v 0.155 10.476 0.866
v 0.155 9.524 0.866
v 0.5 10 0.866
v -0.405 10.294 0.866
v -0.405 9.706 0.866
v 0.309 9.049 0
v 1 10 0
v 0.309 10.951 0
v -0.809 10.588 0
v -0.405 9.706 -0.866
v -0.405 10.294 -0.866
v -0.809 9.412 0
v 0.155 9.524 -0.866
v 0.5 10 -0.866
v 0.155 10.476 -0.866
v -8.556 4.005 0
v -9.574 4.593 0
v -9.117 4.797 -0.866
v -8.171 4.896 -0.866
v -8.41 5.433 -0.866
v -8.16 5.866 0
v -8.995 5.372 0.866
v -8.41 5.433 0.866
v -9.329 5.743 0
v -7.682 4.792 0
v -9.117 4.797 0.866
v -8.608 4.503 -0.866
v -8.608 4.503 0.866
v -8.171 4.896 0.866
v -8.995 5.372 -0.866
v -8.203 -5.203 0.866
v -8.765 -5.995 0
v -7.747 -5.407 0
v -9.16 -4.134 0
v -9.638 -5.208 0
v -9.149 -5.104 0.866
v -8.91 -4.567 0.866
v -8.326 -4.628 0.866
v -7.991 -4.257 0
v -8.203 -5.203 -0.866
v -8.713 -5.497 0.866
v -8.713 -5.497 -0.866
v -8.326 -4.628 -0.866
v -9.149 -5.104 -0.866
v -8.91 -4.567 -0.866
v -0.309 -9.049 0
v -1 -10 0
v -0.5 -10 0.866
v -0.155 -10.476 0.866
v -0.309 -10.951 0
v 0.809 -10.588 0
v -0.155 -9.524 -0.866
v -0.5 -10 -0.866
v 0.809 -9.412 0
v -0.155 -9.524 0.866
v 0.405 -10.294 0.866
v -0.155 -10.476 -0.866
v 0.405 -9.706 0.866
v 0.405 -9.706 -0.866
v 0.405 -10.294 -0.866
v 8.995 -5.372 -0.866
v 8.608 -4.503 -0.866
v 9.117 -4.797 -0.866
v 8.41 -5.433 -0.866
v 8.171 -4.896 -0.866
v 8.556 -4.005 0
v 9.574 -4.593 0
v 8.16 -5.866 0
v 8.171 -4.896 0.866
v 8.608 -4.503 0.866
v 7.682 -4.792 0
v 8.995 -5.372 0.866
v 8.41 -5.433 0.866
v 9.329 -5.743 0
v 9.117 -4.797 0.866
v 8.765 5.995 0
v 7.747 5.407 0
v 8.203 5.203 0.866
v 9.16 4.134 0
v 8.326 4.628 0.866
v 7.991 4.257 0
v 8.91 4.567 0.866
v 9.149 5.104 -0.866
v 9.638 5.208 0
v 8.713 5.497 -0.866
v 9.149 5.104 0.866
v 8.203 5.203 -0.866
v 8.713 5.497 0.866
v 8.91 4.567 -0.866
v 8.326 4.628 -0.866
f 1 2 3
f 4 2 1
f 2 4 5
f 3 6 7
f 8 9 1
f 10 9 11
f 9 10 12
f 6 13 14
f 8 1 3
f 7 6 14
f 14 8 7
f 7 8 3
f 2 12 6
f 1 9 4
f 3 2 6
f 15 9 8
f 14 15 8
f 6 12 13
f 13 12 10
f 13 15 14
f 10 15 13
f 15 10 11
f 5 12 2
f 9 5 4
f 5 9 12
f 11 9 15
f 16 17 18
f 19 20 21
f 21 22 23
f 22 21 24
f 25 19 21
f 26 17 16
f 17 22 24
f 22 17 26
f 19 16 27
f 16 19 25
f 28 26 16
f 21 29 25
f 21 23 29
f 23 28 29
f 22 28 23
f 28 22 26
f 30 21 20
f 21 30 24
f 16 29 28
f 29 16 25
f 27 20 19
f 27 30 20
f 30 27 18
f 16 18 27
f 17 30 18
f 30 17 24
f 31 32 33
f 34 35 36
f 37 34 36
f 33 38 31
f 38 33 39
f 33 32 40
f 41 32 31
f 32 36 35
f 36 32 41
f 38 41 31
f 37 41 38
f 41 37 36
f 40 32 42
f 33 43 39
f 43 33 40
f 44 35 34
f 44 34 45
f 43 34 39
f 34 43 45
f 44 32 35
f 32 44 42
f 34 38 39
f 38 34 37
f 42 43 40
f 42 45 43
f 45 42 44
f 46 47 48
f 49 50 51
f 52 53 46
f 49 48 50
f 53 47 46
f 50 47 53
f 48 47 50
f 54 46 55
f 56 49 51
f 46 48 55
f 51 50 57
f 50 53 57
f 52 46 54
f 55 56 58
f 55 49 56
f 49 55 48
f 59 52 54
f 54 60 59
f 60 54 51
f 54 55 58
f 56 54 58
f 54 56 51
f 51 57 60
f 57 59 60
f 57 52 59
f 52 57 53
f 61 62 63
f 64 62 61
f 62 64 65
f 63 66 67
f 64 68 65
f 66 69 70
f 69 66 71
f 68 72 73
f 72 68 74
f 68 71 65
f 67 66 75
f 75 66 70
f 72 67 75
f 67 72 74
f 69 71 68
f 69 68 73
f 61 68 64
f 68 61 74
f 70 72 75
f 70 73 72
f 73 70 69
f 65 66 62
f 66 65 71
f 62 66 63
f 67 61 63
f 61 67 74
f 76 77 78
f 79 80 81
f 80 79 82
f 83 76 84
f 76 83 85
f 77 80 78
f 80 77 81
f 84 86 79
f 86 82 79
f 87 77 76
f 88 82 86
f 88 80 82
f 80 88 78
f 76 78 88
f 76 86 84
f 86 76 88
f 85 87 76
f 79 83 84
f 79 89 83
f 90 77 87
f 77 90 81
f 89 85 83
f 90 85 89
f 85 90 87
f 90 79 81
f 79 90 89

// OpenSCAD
for ( i = [0 : 5] )
{
    rotate( i * 360 / 6, [0, 0, 1])
    translate([0, 10, 0])
    sphere(r = 1);
}
